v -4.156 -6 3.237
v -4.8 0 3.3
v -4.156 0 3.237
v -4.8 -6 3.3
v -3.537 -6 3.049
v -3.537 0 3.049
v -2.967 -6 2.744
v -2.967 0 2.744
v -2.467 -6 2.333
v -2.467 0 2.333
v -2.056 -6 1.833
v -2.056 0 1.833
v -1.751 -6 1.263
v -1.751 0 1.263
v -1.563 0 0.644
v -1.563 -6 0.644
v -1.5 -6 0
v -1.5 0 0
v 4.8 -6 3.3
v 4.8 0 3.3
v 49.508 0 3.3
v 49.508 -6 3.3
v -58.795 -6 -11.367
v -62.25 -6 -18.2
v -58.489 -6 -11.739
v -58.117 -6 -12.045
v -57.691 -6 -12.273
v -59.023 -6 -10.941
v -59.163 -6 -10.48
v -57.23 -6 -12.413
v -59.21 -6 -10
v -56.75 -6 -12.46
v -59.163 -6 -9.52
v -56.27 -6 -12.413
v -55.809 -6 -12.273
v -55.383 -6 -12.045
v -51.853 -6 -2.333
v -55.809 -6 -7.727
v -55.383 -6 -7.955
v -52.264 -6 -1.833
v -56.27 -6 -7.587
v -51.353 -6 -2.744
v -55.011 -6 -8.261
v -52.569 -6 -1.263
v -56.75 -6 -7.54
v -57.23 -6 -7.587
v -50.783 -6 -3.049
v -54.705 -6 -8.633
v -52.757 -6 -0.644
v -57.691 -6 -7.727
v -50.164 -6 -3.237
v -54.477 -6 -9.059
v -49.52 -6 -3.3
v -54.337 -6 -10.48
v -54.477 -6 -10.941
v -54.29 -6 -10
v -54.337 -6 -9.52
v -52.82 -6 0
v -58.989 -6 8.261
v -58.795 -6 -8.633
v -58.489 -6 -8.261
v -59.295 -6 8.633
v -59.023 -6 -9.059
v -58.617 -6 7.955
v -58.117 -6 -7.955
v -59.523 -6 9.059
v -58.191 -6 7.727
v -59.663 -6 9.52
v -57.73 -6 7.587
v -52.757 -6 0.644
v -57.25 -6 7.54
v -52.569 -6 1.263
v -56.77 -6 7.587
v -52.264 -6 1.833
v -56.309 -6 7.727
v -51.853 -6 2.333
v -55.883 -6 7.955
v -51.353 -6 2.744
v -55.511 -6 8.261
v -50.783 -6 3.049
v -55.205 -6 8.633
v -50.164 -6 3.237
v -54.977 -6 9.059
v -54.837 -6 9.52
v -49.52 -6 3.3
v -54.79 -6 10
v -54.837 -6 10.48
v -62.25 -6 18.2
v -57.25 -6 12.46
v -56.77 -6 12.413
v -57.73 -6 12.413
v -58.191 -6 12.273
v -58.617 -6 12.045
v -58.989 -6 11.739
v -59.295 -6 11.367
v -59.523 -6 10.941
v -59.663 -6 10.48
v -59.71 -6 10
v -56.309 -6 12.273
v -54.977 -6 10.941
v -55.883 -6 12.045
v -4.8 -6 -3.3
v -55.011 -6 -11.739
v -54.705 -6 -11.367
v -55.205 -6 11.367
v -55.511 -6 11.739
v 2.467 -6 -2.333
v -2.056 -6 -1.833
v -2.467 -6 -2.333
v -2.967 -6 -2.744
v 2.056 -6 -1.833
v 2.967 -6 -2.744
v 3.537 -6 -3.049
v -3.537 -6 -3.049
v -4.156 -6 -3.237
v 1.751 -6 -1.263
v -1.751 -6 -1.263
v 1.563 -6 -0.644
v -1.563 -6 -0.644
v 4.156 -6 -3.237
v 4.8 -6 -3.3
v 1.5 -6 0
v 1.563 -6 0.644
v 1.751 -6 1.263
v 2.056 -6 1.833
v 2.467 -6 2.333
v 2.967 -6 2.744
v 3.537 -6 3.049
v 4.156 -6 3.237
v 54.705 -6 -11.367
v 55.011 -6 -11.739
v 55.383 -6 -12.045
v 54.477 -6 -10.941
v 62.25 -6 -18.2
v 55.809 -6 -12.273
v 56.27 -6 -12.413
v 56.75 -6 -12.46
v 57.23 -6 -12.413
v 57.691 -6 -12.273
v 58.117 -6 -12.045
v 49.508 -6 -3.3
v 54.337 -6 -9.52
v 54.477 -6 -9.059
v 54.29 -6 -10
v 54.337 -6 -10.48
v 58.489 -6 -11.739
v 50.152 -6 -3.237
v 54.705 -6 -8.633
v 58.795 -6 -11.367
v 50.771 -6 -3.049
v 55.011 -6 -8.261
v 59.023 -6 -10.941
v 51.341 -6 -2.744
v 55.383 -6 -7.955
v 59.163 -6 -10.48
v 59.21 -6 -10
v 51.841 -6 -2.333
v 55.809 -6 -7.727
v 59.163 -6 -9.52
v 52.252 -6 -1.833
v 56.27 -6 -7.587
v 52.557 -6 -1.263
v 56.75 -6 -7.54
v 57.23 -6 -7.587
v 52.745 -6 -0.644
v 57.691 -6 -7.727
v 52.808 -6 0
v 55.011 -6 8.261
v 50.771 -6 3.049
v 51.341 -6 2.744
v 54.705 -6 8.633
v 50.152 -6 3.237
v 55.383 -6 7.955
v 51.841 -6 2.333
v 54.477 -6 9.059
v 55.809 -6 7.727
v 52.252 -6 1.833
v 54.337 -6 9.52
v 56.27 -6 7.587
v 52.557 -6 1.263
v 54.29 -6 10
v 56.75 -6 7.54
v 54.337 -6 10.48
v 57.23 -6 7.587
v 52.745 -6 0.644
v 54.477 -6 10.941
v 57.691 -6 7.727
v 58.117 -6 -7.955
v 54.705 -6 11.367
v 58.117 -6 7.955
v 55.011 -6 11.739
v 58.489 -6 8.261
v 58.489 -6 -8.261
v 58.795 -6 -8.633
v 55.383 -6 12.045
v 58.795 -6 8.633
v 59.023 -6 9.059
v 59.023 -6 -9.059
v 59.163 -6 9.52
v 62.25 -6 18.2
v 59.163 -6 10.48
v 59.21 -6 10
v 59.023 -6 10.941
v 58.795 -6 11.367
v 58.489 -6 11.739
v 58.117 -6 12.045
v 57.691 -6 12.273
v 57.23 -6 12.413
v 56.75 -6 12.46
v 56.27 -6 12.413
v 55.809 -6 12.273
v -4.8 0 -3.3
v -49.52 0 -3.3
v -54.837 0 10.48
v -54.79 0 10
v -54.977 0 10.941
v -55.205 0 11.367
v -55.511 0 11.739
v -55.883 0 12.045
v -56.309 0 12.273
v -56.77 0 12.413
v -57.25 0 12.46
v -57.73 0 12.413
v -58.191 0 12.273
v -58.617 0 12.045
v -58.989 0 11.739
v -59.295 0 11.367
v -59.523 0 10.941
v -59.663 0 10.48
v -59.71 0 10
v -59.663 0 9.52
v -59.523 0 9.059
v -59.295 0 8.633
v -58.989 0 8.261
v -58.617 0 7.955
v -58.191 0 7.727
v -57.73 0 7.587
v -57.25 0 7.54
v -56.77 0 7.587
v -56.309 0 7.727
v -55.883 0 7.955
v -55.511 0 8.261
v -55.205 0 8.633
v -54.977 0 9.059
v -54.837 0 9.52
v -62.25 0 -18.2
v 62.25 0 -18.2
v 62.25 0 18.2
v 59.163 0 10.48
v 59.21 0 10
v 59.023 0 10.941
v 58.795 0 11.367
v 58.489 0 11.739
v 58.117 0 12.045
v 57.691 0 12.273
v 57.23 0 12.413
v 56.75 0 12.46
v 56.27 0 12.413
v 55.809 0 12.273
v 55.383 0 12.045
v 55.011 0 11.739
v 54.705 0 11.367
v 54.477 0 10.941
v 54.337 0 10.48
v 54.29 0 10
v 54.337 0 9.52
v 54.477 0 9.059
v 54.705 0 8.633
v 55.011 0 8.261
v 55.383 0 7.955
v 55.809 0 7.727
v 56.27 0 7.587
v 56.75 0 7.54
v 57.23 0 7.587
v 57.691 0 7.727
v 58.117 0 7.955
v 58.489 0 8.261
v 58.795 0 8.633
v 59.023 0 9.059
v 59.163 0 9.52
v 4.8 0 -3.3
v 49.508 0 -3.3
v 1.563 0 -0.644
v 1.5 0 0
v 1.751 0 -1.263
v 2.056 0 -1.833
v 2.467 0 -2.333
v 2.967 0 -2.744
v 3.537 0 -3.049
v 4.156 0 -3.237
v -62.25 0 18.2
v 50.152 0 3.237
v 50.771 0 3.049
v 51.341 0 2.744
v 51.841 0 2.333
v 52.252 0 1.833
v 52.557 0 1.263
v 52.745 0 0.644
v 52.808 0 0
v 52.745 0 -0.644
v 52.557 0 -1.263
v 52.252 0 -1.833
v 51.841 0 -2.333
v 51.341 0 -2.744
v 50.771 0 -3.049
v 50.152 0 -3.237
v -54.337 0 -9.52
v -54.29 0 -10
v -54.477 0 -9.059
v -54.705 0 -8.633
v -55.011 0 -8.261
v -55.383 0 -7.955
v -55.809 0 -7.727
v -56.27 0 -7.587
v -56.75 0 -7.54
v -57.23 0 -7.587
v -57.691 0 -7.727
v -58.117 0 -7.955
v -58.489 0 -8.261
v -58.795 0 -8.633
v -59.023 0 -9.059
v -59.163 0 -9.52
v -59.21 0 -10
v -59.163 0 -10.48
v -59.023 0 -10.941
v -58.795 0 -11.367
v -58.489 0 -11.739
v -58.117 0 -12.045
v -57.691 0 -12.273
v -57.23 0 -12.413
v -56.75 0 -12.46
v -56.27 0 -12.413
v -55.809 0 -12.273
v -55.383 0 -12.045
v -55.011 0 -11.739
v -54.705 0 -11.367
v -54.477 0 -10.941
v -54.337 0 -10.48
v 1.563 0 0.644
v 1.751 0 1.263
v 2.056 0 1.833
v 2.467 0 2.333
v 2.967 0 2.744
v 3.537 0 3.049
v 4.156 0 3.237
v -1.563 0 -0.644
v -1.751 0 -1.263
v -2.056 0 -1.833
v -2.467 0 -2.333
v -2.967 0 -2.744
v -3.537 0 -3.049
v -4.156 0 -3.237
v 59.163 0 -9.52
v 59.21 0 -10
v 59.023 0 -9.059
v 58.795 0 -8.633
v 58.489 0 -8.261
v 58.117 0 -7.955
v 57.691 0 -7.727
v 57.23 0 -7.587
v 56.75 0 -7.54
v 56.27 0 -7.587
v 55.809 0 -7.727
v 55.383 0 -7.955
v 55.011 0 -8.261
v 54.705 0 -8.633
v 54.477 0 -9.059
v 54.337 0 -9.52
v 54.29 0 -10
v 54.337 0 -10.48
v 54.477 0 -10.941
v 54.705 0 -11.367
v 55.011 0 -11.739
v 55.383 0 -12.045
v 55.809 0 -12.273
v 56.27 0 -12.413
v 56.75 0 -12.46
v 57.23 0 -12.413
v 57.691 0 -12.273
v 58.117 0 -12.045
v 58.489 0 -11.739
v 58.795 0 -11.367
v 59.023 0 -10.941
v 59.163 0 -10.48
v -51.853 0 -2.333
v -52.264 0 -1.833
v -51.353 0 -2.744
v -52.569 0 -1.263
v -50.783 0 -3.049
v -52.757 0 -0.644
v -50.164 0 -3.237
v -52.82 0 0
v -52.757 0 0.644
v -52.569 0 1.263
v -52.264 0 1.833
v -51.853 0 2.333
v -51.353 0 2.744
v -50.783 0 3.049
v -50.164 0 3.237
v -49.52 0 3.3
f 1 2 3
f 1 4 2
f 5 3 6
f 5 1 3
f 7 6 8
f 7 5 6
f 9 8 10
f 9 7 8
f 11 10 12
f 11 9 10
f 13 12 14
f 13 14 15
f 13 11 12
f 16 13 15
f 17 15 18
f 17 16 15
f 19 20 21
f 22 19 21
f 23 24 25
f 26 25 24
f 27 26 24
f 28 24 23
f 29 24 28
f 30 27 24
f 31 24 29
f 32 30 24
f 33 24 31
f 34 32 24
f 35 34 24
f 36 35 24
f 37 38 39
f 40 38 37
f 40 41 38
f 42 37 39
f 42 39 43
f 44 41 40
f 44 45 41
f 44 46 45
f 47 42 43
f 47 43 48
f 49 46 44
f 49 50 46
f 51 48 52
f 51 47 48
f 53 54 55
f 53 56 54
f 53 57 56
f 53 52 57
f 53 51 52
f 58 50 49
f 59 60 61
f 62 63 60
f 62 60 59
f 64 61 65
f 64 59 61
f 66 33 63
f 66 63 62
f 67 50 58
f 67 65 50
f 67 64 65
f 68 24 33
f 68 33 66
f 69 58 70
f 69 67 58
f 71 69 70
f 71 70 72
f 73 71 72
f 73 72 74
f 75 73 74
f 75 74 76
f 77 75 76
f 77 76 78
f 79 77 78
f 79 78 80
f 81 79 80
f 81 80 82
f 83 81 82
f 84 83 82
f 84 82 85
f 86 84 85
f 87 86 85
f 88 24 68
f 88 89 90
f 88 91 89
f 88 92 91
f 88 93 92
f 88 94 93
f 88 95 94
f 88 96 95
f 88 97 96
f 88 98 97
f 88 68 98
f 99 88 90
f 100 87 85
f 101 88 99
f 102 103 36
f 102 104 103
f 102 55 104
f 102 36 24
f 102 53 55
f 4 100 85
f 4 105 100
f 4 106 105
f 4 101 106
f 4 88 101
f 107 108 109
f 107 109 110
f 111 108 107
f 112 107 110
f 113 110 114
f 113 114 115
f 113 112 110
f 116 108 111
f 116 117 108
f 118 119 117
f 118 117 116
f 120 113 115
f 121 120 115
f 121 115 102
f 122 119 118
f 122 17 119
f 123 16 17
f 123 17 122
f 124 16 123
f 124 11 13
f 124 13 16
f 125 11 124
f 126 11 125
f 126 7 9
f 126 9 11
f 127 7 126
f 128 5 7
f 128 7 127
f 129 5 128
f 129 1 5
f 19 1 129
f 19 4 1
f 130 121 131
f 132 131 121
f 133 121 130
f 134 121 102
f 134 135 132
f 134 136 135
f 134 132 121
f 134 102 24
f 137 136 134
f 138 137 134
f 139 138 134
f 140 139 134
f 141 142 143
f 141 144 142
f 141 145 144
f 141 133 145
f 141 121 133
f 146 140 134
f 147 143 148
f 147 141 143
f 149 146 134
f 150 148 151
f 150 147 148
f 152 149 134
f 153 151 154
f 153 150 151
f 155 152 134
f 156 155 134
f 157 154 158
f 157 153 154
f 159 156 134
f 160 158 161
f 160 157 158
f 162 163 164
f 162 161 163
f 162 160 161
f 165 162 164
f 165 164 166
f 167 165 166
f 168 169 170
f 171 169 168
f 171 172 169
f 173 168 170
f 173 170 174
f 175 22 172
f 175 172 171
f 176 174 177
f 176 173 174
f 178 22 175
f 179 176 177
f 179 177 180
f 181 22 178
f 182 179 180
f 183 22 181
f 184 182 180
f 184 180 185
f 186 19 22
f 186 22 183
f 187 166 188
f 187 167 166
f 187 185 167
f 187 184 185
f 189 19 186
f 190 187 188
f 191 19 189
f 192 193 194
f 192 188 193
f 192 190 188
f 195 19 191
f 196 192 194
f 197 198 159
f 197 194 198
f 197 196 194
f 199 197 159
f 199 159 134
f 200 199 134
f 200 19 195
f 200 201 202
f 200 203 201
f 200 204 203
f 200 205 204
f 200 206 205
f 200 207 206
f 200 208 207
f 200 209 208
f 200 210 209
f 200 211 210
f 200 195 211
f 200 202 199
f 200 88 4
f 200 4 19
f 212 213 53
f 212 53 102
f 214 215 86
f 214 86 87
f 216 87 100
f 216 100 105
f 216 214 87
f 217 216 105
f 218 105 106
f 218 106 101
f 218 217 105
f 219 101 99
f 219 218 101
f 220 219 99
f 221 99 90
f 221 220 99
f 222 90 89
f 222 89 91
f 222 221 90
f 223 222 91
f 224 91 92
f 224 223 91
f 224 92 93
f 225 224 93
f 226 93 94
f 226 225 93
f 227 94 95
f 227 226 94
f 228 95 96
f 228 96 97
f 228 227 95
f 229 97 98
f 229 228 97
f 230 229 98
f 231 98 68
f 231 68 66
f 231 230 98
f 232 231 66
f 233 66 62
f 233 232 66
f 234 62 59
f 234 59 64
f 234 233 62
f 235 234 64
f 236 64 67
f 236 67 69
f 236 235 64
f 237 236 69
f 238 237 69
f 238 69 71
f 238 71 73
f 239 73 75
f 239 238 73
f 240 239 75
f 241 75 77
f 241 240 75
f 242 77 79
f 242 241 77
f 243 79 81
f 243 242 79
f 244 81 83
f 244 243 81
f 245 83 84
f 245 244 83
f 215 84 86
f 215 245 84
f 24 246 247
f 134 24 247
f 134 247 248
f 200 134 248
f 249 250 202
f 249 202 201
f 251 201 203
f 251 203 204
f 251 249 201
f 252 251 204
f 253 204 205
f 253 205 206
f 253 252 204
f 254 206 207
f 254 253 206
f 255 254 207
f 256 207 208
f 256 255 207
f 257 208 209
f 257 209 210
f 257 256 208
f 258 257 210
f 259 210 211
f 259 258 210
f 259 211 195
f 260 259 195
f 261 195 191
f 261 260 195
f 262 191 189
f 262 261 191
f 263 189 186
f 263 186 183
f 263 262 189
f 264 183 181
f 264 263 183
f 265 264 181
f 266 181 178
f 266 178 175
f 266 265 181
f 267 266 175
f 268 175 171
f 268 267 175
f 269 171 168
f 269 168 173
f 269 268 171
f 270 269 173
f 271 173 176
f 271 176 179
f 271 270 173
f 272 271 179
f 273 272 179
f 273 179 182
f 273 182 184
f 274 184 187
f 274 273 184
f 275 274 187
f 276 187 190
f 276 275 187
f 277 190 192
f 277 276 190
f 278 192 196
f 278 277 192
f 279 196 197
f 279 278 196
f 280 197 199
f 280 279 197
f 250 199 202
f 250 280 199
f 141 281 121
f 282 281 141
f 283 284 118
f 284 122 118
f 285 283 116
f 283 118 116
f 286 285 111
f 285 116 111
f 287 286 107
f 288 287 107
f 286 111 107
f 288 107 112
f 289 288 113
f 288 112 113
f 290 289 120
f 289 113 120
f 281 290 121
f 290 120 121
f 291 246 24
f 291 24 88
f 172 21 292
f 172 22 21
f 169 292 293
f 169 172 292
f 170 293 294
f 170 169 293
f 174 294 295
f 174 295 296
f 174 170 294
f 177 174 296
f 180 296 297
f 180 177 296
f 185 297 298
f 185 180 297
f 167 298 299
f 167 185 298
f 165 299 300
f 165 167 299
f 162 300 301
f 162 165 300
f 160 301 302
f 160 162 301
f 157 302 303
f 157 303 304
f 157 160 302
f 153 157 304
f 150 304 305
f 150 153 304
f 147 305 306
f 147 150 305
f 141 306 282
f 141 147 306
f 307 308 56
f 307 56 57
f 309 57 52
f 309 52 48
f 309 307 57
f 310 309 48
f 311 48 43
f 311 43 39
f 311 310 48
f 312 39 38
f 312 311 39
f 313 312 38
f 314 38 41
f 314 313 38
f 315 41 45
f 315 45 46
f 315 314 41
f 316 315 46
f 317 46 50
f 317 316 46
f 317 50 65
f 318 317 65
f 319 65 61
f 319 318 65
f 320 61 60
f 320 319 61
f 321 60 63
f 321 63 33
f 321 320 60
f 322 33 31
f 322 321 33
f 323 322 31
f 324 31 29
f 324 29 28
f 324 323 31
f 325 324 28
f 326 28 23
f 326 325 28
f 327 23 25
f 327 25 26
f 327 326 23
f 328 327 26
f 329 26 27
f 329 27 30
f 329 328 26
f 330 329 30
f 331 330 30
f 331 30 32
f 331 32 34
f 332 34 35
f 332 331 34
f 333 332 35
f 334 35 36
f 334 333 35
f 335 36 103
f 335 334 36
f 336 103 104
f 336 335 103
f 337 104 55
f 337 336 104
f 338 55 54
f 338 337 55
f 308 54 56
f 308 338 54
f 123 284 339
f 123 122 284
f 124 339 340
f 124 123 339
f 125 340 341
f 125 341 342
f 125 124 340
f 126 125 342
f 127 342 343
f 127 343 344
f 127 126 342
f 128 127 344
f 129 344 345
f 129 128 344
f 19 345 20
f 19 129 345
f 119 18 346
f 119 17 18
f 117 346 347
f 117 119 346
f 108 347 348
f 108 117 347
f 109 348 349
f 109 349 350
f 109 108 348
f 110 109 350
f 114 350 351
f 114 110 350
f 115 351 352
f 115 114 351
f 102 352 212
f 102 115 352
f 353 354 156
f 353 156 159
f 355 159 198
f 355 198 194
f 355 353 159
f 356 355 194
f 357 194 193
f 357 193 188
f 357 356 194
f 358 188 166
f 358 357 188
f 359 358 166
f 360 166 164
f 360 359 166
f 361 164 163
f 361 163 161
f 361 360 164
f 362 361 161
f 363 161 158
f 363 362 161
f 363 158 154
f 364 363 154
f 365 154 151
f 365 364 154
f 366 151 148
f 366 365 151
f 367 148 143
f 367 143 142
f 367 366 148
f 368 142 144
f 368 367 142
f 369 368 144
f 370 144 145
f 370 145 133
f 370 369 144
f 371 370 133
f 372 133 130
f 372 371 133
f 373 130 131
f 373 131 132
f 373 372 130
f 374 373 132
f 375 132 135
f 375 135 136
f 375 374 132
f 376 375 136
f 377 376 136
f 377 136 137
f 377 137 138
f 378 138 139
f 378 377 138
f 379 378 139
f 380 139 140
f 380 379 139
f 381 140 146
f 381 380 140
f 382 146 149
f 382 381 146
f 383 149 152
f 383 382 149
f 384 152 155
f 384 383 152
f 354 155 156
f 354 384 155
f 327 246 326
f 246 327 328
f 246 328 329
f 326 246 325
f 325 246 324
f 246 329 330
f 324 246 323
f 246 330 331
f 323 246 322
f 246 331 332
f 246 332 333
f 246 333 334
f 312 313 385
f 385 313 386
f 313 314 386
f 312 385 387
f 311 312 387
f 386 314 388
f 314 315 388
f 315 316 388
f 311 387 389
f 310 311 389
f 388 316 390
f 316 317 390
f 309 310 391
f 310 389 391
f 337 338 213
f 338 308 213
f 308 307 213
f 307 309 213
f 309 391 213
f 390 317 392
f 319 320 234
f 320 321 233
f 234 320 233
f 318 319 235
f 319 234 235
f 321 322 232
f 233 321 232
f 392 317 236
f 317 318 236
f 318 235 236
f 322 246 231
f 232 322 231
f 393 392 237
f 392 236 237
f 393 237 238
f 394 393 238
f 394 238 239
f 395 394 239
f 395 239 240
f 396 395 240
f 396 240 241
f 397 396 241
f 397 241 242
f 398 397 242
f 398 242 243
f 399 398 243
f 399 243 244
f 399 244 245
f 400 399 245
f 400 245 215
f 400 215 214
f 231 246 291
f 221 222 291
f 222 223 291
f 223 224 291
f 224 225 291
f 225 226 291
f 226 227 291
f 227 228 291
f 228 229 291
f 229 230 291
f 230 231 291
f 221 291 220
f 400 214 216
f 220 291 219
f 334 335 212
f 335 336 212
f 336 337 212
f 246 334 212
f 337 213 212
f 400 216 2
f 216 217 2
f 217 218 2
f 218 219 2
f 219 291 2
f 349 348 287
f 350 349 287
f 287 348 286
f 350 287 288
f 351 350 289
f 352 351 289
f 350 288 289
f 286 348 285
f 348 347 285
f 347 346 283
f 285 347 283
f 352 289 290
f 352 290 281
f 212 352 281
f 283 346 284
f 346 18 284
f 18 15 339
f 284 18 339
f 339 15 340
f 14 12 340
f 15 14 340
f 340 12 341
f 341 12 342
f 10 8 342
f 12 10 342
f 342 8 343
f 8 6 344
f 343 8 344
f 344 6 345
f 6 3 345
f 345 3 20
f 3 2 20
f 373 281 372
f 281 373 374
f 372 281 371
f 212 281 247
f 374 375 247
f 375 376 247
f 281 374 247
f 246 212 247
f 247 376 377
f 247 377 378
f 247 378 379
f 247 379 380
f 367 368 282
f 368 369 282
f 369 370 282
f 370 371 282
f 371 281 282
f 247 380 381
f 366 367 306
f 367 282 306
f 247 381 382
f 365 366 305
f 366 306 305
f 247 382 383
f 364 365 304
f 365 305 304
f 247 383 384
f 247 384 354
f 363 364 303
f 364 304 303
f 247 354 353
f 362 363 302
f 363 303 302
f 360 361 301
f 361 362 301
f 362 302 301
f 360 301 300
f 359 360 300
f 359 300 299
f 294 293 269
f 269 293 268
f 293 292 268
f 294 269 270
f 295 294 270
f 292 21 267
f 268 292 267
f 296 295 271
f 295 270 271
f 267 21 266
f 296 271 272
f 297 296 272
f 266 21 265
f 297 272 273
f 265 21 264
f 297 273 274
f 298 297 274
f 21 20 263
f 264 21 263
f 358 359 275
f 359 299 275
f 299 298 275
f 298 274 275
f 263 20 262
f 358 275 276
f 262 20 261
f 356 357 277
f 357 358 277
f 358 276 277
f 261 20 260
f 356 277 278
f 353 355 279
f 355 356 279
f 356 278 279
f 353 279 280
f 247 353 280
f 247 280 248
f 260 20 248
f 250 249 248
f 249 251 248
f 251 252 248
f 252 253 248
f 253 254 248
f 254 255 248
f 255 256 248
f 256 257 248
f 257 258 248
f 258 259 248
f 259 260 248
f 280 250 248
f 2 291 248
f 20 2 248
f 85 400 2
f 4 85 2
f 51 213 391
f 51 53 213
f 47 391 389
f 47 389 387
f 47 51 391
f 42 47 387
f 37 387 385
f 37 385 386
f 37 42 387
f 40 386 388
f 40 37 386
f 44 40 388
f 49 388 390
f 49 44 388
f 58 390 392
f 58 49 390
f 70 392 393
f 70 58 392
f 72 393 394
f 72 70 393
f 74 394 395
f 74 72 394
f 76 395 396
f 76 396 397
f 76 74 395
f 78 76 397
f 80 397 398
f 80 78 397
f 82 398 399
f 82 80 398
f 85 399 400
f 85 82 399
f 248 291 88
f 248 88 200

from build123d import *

# Parameters (mm, degrees)
F0_W     = 124.5
F0_H     = 36.4
F0_R     = 2.46
F0_W_2   = 51.32
F0_H_2   = 6.6
F0_W_3   = 51.308
F1_DEPTH = 6
F2_R     = 3.3
F3_R     = 3.29999
F4_R     = 3.3
F5_R     = 3.29999
F6_R     = 3.3
F7_R     = 3.29999
F8_R     = 3.3
F9_R     = 3.29999


# Not quite as in the source:
# - a fillet or chamfer is up to 0.001 mm smaller than in the source, because OpenCascade refuses the exact size


with BuildPart() as f1:
    # F0 (on Front) → F1 (new body)
    with BuildSketch(Plane.XZ):
        Rectangle(F0_W, F0_H)
        with Locations((-56.75, -10)):
            Circle(F0_R, mode=Mode.SUBTRACT)
        with Locations((-27.16, 0)):
            Rectangle(F0_W_2, F0_H_2, mode=Mode.SUBTRACT)
        with Locations((56.75, -10)):
            Circle(F0_R, mode=Mode.SUBTRACT)
        with Locations((27.154, 0)):
            Rectangle(F0_W_3, F0_H_2, mode=Mode.SUBTRACT)
        with Locations((-57.25, 10)):
            Circle(F0_R, mode=Mode.SUBTRACT)
        with Locations((56.75, 10)):
            Circle(F0_R, mode=Mode.SUBTRACT)
    extrude(amount=F1_DEPTH)

    # F2
    f2_edges = [f1.edges().sort_by_distance(p)[0] for p in [
        (-52.82, -3, -3.3),
    ]]
    fillet(f2_edges, radius=F2_R)

    # F3 (radius 3.3 in the source; OpenCascade refuses exactly that, so slightly less here)
    f3_edges = [f1.edges().sort_by_distance(p)[0] for p in [
        (-52.82, -3, 3.3),
    ]]
    fillet(f3_edges, radius=F3_R)

    # F4
    f4_edges = [f1.edges().sort_by_distance(p)[0] for p in [
        (-1.5, -3, 3.3),
    ]]
    fillet(f4_edges, radius=F4_R)

    # F5 (radius 3.3 in the source; OpenCascade refuses exactly that, so slightly less here)
    f5_edges = [f1.edges().sort_by_distance(p)[0] for p in [
        (-1.5, -3, -3.3),
    ]]
    fillet(f5_edges, radius=F5_R)

    # F6
    f6_edges = [f1.edges().sort_by_distance(p)[0] for p in [
        (1.5, -3, 3.3),
    ]]
    fillet(f6_edges, radius=F6_R)

    # F7 (radius 3.3 in the source; OpenCascade refuses exactly that, so slightly less here)
    f7_edges = [f1.edges().sort_by_distance(p)[0] for p in [
        (1.5, -3, -3.3),
    ]]
    fillet(f7_edges, radius=F7_R)

    # F8
    f8_edges = [f1.edges().sort_by_distance(p)[0] for p in [
        (52.808, -3, 3.3),
    ]]
    fillet(f8_edges, radius=F8_R)

    # F9 (radius 3.3 in the source; OpenCascade refuses exactly that, so slightly less here)
    f9_edges = [f1.edges().sort_by_distance(p)[0] for p in [
        (52.808, -3, -3.3),
    ]]
    fillet(f9_edges, radius=F9_R)


solid = f1.part
